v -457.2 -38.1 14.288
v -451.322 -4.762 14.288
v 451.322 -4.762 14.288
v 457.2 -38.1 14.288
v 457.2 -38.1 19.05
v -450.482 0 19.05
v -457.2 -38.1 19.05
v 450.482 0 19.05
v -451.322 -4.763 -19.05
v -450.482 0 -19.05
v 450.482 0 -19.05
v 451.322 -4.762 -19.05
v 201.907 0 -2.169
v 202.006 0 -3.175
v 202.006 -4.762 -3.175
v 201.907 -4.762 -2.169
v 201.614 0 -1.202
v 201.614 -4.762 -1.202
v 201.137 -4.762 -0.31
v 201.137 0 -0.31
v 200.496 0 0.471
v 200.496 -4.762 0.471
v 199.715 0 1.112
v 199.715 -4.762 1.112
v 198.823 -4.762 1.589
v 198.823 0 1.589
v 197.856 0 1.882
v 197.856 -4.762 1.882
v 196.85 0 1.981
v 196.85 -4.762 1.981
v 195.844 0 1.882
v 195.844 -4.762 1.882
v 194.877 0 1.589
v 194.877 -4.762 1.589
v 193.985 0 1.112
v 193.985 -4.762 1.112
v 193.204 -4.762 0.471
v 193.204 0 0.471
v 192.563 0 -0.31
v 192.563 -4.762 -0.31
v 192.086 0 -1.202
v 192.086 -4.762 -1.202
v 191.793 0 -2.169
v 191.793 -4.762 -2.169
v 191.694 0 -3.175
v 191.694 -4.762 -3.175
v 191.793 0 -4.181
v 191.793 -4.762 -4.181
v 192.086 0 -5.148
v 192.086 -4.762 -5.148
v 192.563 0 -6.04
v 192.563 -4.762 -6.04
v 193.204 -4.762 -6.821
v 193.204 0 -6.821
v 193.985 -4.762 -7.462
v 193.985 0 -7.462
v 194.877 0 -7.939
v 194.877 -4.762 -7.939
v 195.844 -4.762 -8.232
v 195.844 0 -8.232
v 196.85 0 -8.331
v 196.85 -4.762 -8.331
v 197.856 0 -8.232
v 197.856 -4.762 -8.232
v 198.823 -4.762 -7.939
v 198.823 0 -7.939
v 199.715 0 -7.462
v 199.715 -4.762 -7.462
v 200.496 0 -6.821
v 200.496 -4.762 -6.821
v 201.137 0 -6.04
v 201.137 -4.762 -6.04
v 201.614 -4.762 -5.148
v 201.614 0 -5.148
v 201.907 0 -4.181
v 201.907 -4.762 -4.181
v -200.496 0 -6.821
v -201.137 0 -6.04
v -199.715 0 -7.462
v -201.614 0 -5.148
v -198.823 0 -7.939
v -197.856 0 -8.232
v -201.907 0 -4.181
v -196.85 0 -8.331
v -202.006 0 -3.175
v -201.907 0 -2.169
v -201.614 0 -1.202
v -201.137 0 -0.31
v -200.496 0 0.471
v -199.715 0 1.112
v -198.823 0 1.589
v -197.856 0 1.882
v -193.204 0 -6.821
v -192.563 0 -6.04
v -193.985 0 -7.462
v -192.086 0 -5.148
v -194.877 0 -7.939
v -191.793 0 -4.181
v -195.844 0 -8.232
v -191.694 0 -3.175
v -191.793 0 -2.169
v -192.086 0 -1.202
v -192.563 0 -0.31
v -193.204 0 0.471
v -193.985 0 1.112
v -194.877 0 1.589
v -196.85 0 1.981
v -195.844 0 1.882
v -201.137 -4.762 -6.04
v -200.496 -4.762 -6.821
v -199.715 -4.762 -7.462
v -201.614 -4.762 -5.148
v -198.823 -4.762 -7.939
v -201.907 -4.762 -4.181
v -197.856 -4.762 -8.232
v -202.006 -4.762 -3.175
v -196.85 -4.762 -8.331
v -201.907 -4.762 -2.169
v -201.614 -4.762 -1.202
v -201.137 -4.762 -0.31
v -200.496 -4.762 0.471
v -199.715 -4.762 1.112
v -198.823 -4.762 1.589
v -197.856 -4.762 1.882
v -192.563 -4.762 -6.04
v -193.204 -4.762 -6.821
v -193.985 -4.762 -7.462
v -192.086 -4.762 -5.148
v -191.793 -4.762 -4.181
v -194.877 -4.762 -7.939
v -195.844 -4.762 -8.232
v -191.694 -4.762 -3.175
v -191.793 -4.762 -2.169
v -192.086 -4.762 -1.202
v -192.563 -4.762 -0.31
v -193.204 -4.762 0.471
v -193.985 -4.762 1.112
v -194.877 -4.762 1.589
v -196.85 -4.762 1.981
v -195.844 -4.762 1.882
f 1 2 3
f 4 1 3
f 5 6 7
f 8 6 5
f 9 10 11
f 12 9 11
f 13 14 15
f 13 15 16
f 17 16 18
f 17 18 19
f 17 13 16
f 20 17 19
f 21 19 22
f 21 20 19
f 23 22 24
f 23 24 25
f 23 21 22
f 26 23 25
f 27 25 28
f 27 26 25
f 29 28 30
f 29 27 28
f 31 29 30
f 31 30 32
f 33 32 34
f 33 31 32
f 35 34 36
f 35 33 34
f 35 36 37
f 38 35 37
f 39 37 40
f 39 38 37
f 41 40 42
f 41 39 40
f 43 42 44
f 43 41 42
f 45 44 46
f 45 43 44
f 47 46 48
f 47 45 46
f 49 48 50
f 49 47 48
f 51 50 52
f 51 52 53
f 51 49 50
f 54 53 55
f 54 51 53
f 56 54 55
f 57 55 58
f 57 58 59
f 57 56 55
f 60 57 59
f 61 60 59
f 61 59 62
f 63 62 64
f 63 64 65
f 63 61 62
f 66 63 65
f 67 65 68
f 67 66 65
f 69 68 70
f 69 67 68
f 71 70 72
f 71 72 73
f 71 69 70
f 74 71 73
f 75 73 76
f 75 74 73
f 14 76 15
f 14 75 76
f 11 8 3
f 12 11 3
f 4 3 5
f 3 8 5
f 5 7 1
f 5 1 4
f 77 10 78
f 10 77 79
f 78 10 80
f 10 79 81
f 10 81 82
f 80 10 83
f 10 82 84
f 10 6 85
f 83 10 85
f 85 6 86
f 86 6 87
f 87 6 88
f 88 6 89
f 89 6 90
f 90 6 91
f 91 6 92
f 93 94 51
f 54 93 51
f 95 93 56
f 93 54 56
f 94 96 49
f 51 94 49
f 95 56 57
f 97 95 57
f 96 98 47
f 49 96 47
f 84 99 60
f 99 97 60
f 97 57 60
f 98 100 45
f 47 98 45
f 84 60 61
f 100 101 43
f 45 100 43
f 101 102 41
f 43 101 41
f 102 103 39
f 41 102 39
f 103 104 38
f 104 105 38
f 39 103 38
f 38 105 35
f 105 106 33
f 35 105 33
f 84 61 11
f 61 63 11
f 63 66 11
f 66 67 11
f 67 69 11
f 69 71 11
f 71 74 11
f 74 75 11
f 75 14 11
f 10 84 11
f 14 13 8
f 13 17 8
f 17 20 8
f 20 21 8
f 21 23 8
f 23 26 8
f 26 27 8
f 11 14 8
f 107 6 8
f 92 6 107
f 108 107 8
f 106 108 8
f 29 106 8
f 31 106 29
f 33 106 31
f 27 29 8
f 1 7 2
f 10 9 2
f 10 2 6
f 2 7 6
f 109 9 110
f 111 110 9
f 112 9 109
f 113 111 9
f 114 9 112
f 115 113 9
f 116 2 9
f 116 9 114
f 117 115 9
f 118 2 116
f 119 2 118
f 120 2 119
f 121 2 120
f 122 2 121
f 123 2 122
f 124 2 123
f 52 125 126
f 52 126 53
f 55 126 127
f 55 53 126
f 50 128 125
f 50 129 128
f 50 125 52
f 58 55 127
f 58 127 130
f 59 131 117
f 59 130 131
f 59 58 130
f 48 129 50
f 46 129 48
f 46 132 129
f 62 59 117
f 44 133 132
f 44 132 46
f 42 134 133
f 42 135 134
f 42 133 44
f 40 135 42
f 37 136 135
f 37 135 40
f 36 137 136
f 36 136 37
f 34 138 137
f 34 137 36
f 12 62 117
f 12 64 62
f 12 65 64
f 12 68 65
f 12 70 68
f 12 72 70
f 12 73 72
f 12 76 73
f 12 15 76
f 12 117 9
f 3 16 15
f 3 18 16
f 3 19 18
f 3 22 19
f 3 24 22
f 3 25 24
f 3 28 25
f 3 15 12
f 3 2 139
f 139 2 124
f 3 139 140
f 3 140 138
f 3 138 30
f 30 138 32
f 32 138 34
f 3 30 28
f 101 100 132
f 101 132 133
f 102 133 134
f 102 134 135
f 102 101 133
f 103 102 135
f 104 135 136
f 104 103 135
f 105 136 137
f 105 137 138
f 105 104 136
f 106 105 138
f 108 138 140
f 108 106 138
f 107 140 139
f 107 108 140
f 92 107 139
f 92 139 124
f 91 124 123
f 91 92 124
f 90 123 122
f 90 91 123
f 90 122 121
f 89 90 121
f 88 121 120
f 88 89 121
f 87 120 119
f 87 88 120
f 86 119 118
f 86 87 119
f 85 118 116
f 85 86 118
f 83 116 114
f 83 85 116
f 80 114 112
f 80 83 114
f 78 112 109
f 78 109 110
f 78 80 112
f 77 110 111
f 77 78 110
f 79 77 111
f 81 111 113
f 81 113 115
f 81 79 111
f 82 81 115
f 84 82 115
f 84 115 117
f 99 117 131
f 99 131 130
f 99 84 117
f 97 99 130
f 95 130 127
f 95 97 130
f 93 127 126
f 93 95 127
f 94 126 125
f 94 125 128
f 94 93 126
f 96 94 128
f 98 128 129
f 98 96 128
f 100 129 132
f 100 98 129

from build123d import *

# Parameters (mm, degrees)
F0_W     = 914.4
F0_H     = 38.1
F0_R     = 5.1562
F1_DEPTH = 4.7625
F2_W     = 914.4
F2_H     = 4.7625
F3_DEPTH = 33.3375
F5_DEPTH = 38.1


with BuildPart() as f1:
    # F0 (on Front) → F1 (new body)
    with BuildSketch(Plane.XZ):
        Rectangle(F0_W, F0_H)
        with Locations((-196.85, -3.175)):
            Circle(F0_R, mode=Mode.SUBTRACT)
        with Locations((196.85, -3.175)):
            Circle(F0_R, mode=Mode.SUBTRACT)
    extrude(amount=F1_DEPTH)

    # F2 (on face) → F3 (join)
    with BuildSketch(Plane.XZ.offset(4.7625)):
        with Locations((0, 16.66875)):
            Rectangle(F2_W, F2_H)
    extrude(amount=F3_DEPTH)

    # F4 (on face) → F5 (cut)
    with BuildSketch(Plane.XY.offset(19.05)):
        Polygon((450.481942, 0), (457.2, -38.1), (457.2, 0), align=None)
        Polygon((-457.2, 0), (-457.2, -38.1), (-450.481942, 0), align=None)
    extrude(amount=-F5_DEPTH, mode=Mode.SUBTRACT)


solid = f1.part
